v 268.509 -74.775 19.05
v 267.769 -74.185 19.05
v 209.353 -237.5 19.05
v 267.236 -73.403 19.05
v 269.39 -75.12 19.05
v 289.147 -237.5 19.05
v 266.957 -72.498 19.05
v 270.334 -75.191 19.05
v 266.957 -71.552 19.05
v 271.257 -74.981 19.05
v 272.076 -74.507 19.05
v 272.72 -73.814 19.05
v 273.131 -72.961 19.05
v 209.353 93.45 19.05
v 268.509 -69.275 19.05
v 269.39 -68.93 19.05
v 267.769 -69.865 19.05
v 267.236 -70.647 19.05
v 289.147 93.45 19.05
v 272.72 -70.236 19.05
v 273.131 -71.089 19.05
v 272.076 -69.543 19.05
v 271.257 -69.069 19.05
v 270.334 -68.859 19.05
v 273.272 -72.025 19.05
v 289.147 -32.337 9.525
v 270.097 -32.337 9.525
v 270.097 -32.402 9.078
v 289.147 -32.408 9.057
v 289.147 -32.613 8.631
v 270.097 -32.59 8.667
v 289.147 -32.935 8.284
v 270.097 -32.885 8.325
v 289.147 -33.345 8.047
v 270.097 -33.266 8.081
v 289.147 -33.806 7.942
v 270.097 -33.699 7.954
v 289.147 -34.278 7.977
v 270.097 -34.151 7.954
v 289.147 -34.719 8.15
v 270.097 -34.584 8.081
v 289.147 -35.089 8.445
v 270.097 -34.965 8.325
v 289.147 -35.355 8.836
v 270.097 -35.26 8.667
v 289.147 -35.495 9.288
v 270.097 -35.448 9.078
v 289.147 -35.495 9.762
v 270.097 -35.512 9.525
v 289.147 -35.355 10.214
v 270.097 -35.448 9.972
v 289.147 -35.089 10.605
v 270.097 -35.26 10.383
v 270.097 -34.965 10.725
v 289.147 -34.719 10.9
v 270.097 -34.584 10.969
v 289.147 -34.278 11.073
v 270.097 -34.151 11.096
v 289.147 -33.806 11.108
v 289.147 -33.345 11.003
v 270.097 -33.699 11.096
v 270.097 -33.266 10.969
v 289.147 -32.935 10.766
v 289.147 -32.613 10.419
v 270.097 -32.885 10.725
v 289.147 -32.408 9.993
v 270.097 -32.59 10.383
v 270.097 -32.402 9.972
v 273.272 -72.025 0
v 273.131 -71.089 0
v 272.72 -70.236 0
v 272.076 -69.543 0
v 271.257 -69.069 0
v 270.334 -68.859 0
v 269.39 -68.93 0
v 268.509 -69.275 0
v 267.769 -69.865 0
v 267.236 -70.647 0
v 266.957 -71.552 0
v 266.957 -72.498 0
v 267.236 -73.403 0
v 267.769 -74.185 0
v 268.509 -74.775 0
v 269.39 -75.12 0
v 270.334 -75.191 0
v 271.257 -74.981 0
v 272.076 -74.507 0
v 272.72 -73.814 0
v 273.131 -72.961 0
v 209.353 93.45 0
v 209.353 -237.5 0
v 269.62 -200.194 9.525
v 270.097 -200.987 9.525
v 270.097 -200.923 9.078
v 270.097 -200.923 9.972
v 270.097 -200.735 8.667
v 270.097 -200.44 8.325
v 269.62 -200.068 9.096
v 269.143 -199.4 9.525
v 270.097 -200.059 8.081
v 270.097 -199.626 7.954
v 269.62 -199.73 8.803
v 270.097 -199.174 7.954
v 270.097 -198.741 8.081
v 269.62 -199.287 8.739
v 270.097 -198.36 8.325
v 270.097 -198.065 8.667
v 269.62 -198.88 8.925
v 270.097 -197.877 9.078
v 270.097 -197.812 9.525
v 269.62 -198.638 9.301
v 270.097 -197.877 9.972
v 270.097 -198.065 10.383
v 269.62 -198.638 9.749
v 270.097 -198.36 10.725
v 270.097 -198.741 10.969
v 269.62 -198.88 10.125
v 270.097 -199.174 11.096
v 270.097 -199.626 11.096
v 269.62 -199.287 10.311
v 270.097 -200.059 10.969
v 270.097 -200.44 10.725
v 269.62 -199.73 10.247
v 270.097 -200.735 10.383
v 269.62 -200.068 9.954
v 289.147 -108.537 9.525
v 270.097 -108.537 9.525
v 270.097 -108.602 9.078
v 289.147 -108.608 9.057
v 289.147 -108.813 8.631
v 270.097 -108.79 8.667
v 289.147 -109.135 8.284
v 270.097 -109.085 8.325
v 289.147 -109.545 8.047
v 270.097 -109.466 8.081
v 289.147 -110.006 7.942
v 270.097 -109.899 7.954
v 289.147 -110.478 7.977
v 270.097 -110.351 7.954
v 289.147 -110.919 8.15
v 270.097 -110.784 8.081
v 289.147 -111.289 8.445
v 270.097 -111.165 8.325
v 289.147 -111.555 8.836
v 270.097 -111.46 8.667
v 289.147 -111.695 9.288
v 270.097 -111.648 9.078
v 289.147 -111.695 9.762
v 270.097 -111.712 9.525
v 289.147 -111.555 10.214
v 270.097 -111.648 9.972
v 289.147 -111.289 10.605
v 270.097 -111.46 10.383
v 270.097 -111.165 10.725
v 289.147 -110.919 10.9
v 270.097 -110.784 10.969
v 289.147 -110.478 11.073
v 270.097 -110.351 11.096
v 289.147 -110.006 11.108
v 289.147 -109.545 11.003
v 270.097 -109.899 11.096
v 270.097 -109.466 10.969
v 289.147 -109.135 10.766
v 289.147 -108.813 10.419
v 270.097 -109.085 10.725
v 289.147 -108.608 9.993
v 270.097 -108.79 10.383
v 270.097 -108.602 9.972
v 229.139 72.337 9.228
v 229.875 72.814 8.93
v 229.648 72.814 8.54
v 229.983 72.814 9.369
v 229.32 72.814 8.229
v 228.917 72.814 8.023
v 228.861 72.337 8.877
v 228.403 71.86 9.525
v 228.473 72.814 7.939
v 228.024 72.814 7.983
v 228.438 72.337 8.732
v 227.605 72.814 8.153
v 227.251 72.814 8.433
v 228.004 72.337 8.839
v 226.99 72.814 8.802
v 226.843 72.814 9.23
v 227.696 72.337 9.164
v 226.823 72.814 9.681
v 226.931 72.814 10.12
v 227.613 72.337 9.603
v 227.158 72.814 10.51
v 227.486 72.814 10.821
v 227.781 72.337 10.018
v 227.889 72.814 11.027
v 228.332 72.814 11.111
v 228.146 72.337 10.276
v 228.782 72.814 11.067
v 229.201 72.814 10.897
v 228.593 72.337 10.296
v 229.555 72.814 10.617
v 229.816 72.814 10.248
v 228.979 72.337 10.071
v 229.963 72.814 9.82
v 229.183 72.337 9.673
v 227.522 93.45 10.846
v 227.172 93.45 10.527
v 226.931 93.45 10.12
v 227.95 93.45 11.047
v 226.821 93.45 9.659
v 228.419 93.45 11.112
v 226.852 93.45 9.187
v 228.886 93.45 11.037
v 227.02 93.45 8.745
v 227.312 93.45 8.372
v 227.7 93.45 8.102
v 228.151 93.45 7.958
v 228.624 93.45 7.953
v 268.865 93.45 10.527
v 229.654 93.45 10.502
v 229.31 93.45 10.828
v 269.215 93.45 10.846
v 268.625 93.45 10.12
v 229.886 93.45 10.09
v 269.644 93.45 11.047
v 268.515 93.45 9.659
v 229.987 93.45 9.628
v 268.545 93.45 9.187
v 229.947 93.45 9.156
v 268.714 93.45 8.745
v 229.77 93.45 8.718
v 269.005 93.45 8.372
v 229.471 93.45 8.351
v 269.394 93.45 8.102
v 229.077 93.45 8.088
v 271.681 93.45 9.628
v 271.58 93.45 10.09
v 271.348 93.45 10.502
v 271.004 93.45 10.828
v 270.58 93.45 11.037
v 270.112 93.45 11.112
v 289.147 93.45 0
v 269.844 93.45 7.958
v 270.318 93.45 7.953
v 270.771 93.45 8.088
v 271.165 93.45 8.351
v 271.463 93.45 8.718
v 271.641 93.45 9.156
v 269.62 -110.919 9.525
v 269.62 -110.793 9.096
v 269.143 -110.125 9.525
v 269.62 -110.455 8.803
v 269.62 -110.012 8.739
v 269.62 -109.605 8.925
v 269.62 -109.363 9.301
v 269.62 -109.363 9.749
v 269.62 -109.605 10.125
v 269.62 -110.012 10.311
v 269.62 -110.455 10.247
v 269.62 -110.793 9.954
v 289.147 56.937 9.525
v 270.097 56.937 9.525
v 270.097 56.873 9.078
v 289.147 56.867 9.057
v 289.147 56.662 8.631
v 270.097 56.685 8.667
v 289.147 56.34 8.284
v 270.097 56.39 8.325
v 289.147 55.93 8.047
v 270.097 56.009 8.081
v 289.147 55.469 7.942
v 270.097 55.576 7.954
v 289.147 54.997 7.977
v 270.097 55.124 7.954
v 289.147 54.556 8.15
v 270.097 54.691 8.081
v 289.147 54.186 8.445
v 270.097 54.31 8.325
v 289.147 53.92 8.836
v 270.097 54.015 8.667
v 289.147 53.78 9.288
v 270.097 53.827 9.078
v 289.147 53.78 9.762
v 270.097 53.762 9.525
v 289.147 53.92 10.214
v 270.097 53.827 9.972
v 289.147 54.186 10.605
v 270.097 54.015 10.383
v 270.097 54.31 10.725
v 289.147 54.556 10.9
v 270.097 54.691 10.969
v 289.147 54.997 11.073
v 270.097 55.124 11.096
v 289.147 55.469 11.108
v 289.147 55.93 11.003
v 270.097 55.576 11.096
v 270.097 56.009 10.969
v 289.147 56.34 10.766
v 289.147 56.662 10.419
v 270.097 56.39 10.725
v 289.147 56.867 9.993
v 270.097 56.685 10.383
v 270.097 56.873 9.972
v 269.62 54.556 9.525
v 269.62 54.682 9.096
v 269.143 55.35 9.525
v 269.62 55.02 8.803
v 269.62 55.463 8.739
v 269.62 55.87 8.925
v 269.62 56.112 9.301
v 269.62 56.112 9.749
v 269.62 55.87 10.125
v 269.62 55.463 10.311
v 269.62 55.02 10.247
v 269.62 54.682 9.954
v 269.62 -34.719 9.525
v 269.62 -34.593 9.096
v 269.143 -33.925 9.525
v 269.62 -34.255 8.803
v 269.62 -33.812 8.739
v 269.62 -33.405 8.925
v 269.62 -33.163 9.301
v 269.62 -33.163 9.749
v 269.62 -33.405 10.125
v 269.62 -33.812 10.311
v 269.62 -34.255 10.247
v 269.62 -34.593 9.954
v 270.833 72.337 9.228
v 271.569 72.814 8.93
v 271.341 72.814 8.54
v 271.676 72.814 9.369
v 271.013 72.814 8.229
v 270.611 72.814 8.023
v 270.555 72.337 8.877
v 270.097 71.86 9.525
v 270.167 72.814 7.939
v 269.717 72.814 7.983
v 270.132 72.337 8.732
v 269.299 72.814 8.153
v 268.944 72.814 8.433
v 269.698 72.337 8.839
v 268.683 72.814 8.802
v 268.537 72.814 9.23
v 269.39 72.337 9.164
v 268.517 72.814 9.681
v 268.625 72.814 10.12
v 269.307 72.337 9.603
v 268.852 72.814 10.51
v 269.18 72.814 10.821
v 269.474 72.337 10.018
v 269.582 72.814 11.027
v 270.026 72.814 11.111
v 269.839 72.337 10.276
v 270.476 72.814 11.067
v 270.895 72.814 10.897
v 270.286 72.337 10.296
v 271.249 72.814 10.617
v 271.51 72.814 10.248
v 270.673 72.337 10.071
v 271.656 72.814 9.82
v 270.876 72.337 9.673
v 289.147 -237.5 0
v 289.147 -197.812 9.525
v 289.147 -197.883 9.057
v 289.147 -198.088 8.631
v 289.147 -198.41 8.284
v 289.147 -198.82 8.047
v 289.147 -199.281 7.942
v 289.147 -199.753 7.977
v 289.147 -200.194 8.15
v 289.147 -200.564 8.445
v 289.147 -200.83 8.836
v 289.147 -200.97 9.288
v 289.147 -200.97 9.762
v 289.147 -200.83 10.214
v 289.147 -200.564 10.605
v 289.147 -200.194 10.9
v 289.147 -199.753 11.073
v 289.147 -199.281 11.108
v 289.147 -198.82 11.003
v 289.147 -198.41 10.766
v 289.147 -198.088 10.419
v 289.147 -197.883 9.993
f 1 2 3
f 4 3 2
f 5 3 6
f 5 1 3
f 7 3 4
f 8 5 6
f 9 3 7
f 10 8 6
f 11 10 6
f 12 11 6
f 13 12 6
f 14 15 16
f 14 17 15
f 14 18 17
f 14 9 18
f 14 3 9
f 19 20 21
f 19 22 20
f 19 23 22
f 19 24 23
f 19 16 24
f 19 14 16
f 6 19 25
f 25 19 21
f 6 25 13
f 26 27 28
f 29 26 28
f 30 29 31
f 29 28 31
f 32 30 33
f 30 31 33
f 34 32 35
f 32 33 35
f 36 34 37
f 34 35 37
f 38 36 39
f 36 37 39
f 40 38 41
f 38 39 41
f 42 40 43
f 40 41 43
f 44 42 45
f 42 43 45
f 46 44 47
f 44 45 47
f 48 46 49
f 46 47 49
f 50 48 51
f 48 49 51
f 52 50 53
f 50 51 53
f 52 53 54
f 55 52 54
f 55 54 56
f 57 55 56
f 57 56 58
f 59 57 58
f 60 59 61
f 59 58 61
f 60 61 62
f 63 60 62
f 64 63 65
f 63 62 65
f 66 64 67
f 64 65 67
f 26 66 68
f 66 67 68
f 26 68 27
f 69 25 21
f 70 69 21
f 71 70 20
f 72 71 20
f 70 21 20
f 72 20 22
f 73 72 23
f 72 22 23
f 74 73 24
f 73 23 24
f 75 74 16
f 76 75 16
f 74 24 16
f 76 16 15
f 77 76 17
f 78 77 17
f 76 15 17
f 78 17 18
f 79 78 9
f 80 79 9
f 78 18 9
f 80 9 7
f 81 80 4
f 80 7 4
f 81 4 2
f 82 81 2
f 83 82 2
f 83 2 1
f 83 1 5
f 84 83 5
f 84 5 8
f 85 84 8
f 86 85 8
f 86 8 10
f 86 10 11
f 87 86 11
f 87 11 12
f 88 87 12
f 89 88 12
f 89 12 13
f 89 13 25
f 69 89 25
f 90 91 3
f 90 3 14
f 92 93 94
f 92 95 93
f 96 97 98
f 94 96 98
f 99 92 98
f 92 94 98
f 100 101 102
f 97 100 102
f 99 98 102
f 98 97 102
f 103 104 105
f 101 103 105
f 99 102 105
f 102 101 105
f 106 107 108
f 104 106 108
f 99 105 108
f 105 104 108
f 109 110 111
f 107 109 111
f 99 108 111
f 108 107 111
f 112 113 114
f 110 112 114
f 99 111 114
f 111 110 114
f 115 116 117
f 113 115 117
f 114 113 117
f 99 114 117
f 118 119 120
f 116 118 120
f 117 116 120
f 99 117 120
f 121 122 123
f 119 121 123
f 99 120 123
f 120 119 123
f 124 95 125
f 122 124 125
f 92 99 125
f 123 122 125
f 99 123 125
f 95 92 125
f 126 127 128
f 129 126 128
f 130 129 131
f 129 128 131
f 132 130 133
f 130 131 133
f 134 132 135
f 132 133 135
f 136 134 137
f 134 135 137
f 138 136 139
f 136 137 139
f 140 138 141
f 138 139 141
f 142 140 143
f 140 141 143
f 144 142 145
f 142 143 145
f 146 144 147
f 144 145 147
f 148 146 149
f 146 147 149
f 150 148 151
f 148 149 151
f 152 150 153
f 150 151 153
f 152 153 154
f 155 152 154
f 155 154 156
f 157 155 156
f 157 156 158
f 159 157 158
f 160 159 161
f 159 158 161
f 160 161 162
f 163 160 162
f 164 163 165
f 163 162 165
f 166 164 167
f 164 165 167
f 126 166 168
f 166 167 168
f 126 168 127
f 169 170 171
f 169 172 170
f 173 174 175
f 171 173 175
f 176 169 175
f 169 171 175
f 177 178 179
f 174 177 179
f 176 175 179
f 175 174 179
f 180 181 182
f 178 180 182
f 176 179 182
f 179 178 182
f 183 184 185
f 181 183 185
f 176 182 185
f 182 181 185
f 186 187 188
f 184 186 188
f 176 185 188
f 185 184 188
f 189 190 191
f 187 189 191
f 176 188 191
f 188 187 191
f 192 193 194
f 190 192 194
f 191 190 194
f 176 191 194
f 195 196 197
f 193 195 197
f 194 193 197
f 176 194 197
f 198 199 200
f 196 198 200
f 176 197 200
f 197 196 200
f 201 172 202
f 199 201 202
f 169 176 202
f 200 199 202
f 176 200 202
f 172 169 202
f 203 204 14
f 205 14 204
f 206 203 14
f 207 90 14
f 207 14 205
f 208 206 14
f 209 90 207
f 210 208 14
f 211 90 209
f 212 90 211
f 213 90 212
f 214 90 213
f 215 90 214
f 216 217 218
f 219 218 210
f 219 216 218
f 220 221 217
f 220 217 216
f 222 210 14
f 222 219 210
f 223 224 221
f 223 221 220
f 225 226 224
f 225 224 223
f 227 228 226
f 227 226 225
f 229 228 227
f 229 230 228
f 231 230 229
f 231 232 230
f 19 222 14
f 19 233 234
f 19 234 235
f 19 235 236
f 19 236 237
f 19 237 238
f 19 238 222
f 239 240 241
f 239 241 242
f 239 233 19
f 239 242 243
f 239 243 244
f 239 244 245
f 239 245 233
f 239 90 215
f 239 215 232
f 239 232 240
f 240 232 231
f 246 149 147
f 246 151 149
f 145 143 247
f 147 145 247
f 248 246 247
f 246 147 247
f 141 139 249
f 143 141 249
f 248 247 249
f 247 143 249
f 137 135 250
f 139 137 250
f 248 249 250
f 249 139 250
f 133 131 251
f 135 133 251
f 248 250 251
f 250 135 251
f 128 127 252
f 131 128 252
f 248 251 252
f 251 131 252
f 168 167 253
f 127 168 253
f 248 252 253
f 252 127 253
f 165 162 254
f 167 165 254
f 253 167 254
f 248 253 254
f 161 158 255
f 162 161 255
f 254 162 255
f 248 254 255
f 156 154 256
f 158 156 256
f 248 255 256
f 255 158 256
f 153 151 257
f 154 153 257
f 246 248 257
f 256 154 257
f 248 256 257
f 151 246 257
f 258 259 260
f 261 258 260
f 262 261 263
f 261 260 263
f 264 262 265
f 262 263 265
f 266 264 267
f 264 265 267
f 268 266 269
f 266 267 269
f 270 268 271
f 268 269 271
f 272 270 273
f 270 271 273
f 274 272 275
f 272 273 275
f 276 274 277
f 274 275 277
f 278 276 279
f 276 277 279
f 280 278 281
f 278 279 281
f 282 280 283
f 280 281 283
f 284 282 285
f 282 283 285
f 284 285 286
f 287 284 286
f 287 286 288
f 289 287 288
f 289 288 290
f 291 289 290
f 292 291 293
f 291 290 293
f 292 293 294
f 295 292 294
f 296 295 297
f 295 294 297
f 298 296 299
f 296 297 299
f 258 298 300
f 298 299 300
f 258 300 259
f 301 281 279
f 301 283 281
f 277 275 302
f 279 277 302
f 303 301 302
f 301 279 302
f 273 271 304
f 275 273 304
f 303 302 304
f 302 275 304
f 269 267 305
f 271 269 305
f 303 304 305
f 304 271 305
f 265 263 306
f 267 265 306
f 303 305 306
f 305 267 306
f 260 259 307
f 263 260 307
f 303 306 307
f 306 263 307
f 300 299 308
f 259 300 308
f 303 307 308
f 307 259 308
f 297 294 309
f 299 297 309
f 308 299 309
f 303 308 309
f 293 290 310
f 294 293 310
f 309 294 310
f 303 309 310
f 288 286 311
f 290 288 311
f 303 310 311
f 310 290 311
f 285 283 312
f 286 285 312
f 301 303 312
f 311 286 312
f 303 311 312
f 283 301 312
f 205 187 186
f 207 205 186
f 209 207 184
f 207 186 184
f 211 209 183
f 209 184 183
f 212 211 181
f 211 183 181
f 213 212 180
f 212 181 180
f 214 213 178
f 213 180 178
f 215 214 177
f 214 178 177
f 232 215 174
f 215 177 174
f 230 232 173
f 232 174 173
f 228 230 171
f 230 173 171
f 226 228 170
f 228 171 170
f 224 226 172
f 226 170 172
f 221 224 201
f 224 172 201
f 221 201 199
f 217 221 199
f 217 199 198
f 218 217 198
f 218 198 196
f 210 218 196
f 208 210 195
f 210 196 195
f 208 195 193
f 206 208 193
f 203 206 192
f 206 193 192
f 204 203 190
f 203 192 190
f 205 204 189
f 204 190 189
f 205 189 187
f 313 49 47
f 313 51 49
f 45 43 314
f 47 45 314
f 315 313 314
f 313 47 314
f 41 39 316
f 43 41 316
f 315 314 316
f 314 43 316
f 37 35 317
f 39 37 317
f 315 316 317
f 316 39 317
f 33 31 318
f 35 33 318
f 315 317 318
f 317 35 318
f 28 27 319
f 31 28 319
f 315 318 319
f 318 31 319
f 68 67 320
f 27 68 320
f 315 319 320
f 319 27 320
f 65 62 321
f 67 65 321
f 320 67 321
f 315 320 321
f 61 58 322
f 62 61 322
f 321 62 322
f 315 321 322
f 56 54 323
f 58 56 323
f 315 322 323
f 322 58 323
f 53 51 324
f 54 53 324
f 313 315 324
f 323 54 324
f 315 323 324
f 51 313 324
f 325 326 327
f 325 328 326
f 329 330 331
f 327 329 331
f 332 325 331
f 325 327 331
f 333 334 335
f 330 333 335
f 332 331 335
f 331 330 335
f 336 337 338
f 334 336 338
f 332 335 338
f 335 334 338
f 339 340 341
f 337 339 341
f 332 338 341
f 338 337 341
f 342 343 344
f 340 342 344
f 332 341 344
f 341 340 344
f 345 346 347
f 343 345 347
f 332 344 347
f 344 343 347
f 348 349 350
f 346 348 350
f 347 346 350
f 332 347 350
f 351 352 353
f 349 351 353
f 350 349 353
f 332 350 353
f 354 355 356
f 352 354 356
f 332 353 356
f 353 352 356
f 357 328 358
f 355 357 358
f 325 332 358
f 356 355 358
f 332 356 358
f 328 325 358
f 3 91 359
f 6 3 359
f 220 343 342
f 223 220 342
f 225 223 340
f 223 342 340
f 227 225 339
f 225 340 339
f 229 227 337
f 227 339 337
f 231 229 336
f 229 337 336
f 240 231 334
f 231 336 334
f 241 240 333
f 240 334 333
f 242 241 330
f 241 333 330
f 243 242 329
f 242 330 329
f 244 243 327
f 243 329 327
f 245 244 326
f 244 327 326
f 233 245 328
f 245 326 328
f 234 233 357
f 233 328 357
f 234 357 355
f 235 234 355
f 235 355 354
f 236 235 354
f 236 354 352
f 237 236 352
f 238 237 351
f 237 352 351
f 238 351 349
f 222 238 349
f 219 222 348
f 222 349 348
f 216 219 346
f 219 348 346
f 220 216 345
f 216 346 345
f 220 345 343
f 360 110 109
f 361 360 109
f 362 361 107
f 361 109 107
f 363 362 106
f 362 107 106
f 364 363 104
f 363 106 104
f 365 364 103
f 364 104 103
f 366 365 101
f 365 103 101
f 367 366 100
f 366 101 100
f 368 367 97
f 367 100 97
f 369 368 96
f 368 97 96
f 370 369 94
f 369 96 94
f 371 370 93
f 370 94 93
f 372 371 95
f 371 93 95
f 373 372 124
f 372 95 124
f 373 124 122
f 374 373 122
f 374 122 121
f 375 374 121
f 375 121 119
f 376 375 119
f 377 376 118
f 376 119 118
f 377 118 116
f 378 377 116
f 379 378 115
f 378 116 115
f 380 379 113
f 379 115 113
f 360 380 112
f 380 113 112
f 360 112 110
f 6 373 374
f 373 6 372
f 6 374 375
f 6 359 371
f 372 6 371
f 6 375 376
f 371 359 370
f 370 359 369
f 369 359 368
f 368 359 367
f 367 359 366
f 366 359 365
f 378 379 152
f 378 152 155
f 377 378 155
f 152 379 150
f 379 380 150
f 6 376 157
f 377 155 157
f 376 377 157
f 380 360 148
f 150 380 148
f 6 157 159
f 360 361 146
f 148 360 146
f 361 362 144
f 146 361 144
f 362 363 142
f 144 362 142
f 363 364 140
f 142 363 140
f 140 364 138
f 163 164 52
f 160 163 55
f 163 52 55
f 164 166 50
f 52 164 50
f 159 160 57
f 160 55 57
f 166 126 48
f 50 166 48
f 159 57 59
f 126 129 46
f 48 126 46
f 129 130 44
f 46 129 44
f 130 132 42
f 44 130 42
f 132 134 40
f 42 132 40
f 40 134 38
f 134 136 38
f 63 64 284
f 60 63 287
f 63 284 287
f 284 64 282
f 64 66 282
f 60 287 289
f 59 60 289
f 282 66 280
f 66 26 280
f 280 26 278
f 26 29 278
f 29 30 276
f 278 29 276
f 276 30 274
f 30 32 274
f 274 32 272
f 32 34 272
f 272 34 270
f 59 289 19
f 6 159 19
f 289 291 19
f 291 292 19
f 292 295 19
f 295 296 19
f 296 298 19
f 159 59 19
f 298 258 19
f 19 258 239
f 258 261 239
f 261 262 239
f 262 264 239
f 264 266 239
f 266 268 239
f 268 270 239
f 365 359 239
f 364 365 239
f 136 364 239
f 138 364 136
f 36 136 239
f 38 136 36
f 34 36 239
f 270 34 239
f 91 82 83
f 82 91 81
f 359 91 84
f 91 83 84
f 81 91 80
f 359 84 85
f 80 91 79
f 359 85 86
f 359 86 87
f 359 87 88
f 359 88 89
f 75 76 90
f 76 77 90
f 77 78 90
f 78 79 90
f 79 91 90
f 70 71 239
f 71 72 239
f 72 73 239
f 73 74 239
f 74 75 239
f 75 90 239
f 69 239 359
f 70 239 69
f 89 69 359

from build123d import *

# Parameters (mm, degrees)
SKETCH1_W                   = 79.793650928
SKETCH1_H                   = 330.949999988
BOSS_EXTRUDE1_DEPTH         = 19.05
F_1_4_0_25_DIAMETER_HOLE1_D = 6.35
HOLE6_D                     = 3.175
HOLE6_DEPTH                 = 38.1
HOLE6_CSINK_D               = 10.16
HOLE6_CSINK_ANGLE           = 82
HOLE6_TIP                   = 0.953866233
HOLE7_D                     = 3.175
HOLE7_DEPTH                 = 39.686133767
HOLE7_CSINK_D               = 10.16
HOLE7_CSINK_ANGLE           = 82
HOLE7_TIP                   = 0.953866233


with BuildPart() as part:
    # Sketch1 → Boss-Extrude1 (new body)
    with BuildSketch(Plane.XY):
        with Locations((249.249792645, -72.024999997)):
            Rectangle(SKETCH1_W, SKETCH1_H)
    extrude(amount=BOSS_EXTRUDE1_DEPTH)

    # 1/4 (0.25) Diameter Hole1 (through all)
    with Locations(Plane(origin=(0, 0, 0), x_dir=(-1, 0, 0), z_dir=(0, 0, -1))):
        with Locations((-270.096618017, -72.024999997)):
            Hole(F_1_4_0_25_DIAMETER_HOLE1_D / 2)

    # Hole6
    with Locations(Plane(origin=(308.196618109, -72.024999997, 609.909770337), x_dir=(0, -1, 0), z_dir=(1, 0, 0))):
        with Locations((81.549999997, 717.438633361), (-81.549999997, 717.438633361), (-81.549999997, 641.659770441), (-81.549999997, 793.217496281), (-174.999999994, 705.391438111), (-174.999999994, 329.112770337), (-174.999999994, 579.965215507), (-174.999999994, 454.538992941), (-174.999999994, 517.252104224), (-127.374999994, 600.384770441), (-38.1, 600.384770441), (-127.374999994, 376.737770337), (-38.1, 376.737770337), (38.1, 376.737770337), (127.374999994, 376.737770337), (38.1, 600.384770441), (127.374999994, 600.384770441), (174.999999994, 517.252104224), (174.999999994, 454.538992941), (174.999999994, 579.965215507), (174.999999994, 329.112770337), (174.999999994, 705.391438111), (81.549999997, 793.217496281), (81.549999997, 641.659770441)):
            CounterSinkHole(HOLE6_D / 2, HOLE6_CSINK_D / 2, depth=HOLE6_DEPTH, counter_sink_angle=HOLE6_CSINK_ANGLE)
            with Locations((0, 0, -(HOLE6_DEPTH + HOLE6_TIP / 2))):  # 118° drill point
                Cone(0, HOLE6_D / 2, HOLE6_TIP, mode=Mode.SUBTRACT)

    # Hole7
    with Locations(Plane(origin=(-181.039434513, 112.499999997, 386.262770337), x_dir=(0.9271838545667855, -1.3196841813264566e-15, -0.37460659341591657), z_dir=(0, 1, 0))):
        with Locations((546.331381686, 147.924742102), (34.861843518, 129.510688231), (398.711186007, 72.427013068), (25.409302346, 25.4), (393.709302346, 25.4), (604.536477781, 403.287242286), (643.194157759, 387.668525745), (520.756836983, 195.925354764), (559.414516961, 180.306638222), (507.673701708, 163.543458643)):
            CounterSinkHole(HOLE7_D / 2, HOLE7_CSINK_D / 2, depth=HOLE7_DEPTH, counter_sink_angle=HOLE7_CSINK_ANGLE)
            with Locations((0, 0, -(HOLE7_DEPTH + HOLE7_TIP / 2))):  # 118° drill point
                Cone(0, HOLE7_D / 2, HOLE7_TIP, mode=Mode.SUBTRACT)


solid = part.part
